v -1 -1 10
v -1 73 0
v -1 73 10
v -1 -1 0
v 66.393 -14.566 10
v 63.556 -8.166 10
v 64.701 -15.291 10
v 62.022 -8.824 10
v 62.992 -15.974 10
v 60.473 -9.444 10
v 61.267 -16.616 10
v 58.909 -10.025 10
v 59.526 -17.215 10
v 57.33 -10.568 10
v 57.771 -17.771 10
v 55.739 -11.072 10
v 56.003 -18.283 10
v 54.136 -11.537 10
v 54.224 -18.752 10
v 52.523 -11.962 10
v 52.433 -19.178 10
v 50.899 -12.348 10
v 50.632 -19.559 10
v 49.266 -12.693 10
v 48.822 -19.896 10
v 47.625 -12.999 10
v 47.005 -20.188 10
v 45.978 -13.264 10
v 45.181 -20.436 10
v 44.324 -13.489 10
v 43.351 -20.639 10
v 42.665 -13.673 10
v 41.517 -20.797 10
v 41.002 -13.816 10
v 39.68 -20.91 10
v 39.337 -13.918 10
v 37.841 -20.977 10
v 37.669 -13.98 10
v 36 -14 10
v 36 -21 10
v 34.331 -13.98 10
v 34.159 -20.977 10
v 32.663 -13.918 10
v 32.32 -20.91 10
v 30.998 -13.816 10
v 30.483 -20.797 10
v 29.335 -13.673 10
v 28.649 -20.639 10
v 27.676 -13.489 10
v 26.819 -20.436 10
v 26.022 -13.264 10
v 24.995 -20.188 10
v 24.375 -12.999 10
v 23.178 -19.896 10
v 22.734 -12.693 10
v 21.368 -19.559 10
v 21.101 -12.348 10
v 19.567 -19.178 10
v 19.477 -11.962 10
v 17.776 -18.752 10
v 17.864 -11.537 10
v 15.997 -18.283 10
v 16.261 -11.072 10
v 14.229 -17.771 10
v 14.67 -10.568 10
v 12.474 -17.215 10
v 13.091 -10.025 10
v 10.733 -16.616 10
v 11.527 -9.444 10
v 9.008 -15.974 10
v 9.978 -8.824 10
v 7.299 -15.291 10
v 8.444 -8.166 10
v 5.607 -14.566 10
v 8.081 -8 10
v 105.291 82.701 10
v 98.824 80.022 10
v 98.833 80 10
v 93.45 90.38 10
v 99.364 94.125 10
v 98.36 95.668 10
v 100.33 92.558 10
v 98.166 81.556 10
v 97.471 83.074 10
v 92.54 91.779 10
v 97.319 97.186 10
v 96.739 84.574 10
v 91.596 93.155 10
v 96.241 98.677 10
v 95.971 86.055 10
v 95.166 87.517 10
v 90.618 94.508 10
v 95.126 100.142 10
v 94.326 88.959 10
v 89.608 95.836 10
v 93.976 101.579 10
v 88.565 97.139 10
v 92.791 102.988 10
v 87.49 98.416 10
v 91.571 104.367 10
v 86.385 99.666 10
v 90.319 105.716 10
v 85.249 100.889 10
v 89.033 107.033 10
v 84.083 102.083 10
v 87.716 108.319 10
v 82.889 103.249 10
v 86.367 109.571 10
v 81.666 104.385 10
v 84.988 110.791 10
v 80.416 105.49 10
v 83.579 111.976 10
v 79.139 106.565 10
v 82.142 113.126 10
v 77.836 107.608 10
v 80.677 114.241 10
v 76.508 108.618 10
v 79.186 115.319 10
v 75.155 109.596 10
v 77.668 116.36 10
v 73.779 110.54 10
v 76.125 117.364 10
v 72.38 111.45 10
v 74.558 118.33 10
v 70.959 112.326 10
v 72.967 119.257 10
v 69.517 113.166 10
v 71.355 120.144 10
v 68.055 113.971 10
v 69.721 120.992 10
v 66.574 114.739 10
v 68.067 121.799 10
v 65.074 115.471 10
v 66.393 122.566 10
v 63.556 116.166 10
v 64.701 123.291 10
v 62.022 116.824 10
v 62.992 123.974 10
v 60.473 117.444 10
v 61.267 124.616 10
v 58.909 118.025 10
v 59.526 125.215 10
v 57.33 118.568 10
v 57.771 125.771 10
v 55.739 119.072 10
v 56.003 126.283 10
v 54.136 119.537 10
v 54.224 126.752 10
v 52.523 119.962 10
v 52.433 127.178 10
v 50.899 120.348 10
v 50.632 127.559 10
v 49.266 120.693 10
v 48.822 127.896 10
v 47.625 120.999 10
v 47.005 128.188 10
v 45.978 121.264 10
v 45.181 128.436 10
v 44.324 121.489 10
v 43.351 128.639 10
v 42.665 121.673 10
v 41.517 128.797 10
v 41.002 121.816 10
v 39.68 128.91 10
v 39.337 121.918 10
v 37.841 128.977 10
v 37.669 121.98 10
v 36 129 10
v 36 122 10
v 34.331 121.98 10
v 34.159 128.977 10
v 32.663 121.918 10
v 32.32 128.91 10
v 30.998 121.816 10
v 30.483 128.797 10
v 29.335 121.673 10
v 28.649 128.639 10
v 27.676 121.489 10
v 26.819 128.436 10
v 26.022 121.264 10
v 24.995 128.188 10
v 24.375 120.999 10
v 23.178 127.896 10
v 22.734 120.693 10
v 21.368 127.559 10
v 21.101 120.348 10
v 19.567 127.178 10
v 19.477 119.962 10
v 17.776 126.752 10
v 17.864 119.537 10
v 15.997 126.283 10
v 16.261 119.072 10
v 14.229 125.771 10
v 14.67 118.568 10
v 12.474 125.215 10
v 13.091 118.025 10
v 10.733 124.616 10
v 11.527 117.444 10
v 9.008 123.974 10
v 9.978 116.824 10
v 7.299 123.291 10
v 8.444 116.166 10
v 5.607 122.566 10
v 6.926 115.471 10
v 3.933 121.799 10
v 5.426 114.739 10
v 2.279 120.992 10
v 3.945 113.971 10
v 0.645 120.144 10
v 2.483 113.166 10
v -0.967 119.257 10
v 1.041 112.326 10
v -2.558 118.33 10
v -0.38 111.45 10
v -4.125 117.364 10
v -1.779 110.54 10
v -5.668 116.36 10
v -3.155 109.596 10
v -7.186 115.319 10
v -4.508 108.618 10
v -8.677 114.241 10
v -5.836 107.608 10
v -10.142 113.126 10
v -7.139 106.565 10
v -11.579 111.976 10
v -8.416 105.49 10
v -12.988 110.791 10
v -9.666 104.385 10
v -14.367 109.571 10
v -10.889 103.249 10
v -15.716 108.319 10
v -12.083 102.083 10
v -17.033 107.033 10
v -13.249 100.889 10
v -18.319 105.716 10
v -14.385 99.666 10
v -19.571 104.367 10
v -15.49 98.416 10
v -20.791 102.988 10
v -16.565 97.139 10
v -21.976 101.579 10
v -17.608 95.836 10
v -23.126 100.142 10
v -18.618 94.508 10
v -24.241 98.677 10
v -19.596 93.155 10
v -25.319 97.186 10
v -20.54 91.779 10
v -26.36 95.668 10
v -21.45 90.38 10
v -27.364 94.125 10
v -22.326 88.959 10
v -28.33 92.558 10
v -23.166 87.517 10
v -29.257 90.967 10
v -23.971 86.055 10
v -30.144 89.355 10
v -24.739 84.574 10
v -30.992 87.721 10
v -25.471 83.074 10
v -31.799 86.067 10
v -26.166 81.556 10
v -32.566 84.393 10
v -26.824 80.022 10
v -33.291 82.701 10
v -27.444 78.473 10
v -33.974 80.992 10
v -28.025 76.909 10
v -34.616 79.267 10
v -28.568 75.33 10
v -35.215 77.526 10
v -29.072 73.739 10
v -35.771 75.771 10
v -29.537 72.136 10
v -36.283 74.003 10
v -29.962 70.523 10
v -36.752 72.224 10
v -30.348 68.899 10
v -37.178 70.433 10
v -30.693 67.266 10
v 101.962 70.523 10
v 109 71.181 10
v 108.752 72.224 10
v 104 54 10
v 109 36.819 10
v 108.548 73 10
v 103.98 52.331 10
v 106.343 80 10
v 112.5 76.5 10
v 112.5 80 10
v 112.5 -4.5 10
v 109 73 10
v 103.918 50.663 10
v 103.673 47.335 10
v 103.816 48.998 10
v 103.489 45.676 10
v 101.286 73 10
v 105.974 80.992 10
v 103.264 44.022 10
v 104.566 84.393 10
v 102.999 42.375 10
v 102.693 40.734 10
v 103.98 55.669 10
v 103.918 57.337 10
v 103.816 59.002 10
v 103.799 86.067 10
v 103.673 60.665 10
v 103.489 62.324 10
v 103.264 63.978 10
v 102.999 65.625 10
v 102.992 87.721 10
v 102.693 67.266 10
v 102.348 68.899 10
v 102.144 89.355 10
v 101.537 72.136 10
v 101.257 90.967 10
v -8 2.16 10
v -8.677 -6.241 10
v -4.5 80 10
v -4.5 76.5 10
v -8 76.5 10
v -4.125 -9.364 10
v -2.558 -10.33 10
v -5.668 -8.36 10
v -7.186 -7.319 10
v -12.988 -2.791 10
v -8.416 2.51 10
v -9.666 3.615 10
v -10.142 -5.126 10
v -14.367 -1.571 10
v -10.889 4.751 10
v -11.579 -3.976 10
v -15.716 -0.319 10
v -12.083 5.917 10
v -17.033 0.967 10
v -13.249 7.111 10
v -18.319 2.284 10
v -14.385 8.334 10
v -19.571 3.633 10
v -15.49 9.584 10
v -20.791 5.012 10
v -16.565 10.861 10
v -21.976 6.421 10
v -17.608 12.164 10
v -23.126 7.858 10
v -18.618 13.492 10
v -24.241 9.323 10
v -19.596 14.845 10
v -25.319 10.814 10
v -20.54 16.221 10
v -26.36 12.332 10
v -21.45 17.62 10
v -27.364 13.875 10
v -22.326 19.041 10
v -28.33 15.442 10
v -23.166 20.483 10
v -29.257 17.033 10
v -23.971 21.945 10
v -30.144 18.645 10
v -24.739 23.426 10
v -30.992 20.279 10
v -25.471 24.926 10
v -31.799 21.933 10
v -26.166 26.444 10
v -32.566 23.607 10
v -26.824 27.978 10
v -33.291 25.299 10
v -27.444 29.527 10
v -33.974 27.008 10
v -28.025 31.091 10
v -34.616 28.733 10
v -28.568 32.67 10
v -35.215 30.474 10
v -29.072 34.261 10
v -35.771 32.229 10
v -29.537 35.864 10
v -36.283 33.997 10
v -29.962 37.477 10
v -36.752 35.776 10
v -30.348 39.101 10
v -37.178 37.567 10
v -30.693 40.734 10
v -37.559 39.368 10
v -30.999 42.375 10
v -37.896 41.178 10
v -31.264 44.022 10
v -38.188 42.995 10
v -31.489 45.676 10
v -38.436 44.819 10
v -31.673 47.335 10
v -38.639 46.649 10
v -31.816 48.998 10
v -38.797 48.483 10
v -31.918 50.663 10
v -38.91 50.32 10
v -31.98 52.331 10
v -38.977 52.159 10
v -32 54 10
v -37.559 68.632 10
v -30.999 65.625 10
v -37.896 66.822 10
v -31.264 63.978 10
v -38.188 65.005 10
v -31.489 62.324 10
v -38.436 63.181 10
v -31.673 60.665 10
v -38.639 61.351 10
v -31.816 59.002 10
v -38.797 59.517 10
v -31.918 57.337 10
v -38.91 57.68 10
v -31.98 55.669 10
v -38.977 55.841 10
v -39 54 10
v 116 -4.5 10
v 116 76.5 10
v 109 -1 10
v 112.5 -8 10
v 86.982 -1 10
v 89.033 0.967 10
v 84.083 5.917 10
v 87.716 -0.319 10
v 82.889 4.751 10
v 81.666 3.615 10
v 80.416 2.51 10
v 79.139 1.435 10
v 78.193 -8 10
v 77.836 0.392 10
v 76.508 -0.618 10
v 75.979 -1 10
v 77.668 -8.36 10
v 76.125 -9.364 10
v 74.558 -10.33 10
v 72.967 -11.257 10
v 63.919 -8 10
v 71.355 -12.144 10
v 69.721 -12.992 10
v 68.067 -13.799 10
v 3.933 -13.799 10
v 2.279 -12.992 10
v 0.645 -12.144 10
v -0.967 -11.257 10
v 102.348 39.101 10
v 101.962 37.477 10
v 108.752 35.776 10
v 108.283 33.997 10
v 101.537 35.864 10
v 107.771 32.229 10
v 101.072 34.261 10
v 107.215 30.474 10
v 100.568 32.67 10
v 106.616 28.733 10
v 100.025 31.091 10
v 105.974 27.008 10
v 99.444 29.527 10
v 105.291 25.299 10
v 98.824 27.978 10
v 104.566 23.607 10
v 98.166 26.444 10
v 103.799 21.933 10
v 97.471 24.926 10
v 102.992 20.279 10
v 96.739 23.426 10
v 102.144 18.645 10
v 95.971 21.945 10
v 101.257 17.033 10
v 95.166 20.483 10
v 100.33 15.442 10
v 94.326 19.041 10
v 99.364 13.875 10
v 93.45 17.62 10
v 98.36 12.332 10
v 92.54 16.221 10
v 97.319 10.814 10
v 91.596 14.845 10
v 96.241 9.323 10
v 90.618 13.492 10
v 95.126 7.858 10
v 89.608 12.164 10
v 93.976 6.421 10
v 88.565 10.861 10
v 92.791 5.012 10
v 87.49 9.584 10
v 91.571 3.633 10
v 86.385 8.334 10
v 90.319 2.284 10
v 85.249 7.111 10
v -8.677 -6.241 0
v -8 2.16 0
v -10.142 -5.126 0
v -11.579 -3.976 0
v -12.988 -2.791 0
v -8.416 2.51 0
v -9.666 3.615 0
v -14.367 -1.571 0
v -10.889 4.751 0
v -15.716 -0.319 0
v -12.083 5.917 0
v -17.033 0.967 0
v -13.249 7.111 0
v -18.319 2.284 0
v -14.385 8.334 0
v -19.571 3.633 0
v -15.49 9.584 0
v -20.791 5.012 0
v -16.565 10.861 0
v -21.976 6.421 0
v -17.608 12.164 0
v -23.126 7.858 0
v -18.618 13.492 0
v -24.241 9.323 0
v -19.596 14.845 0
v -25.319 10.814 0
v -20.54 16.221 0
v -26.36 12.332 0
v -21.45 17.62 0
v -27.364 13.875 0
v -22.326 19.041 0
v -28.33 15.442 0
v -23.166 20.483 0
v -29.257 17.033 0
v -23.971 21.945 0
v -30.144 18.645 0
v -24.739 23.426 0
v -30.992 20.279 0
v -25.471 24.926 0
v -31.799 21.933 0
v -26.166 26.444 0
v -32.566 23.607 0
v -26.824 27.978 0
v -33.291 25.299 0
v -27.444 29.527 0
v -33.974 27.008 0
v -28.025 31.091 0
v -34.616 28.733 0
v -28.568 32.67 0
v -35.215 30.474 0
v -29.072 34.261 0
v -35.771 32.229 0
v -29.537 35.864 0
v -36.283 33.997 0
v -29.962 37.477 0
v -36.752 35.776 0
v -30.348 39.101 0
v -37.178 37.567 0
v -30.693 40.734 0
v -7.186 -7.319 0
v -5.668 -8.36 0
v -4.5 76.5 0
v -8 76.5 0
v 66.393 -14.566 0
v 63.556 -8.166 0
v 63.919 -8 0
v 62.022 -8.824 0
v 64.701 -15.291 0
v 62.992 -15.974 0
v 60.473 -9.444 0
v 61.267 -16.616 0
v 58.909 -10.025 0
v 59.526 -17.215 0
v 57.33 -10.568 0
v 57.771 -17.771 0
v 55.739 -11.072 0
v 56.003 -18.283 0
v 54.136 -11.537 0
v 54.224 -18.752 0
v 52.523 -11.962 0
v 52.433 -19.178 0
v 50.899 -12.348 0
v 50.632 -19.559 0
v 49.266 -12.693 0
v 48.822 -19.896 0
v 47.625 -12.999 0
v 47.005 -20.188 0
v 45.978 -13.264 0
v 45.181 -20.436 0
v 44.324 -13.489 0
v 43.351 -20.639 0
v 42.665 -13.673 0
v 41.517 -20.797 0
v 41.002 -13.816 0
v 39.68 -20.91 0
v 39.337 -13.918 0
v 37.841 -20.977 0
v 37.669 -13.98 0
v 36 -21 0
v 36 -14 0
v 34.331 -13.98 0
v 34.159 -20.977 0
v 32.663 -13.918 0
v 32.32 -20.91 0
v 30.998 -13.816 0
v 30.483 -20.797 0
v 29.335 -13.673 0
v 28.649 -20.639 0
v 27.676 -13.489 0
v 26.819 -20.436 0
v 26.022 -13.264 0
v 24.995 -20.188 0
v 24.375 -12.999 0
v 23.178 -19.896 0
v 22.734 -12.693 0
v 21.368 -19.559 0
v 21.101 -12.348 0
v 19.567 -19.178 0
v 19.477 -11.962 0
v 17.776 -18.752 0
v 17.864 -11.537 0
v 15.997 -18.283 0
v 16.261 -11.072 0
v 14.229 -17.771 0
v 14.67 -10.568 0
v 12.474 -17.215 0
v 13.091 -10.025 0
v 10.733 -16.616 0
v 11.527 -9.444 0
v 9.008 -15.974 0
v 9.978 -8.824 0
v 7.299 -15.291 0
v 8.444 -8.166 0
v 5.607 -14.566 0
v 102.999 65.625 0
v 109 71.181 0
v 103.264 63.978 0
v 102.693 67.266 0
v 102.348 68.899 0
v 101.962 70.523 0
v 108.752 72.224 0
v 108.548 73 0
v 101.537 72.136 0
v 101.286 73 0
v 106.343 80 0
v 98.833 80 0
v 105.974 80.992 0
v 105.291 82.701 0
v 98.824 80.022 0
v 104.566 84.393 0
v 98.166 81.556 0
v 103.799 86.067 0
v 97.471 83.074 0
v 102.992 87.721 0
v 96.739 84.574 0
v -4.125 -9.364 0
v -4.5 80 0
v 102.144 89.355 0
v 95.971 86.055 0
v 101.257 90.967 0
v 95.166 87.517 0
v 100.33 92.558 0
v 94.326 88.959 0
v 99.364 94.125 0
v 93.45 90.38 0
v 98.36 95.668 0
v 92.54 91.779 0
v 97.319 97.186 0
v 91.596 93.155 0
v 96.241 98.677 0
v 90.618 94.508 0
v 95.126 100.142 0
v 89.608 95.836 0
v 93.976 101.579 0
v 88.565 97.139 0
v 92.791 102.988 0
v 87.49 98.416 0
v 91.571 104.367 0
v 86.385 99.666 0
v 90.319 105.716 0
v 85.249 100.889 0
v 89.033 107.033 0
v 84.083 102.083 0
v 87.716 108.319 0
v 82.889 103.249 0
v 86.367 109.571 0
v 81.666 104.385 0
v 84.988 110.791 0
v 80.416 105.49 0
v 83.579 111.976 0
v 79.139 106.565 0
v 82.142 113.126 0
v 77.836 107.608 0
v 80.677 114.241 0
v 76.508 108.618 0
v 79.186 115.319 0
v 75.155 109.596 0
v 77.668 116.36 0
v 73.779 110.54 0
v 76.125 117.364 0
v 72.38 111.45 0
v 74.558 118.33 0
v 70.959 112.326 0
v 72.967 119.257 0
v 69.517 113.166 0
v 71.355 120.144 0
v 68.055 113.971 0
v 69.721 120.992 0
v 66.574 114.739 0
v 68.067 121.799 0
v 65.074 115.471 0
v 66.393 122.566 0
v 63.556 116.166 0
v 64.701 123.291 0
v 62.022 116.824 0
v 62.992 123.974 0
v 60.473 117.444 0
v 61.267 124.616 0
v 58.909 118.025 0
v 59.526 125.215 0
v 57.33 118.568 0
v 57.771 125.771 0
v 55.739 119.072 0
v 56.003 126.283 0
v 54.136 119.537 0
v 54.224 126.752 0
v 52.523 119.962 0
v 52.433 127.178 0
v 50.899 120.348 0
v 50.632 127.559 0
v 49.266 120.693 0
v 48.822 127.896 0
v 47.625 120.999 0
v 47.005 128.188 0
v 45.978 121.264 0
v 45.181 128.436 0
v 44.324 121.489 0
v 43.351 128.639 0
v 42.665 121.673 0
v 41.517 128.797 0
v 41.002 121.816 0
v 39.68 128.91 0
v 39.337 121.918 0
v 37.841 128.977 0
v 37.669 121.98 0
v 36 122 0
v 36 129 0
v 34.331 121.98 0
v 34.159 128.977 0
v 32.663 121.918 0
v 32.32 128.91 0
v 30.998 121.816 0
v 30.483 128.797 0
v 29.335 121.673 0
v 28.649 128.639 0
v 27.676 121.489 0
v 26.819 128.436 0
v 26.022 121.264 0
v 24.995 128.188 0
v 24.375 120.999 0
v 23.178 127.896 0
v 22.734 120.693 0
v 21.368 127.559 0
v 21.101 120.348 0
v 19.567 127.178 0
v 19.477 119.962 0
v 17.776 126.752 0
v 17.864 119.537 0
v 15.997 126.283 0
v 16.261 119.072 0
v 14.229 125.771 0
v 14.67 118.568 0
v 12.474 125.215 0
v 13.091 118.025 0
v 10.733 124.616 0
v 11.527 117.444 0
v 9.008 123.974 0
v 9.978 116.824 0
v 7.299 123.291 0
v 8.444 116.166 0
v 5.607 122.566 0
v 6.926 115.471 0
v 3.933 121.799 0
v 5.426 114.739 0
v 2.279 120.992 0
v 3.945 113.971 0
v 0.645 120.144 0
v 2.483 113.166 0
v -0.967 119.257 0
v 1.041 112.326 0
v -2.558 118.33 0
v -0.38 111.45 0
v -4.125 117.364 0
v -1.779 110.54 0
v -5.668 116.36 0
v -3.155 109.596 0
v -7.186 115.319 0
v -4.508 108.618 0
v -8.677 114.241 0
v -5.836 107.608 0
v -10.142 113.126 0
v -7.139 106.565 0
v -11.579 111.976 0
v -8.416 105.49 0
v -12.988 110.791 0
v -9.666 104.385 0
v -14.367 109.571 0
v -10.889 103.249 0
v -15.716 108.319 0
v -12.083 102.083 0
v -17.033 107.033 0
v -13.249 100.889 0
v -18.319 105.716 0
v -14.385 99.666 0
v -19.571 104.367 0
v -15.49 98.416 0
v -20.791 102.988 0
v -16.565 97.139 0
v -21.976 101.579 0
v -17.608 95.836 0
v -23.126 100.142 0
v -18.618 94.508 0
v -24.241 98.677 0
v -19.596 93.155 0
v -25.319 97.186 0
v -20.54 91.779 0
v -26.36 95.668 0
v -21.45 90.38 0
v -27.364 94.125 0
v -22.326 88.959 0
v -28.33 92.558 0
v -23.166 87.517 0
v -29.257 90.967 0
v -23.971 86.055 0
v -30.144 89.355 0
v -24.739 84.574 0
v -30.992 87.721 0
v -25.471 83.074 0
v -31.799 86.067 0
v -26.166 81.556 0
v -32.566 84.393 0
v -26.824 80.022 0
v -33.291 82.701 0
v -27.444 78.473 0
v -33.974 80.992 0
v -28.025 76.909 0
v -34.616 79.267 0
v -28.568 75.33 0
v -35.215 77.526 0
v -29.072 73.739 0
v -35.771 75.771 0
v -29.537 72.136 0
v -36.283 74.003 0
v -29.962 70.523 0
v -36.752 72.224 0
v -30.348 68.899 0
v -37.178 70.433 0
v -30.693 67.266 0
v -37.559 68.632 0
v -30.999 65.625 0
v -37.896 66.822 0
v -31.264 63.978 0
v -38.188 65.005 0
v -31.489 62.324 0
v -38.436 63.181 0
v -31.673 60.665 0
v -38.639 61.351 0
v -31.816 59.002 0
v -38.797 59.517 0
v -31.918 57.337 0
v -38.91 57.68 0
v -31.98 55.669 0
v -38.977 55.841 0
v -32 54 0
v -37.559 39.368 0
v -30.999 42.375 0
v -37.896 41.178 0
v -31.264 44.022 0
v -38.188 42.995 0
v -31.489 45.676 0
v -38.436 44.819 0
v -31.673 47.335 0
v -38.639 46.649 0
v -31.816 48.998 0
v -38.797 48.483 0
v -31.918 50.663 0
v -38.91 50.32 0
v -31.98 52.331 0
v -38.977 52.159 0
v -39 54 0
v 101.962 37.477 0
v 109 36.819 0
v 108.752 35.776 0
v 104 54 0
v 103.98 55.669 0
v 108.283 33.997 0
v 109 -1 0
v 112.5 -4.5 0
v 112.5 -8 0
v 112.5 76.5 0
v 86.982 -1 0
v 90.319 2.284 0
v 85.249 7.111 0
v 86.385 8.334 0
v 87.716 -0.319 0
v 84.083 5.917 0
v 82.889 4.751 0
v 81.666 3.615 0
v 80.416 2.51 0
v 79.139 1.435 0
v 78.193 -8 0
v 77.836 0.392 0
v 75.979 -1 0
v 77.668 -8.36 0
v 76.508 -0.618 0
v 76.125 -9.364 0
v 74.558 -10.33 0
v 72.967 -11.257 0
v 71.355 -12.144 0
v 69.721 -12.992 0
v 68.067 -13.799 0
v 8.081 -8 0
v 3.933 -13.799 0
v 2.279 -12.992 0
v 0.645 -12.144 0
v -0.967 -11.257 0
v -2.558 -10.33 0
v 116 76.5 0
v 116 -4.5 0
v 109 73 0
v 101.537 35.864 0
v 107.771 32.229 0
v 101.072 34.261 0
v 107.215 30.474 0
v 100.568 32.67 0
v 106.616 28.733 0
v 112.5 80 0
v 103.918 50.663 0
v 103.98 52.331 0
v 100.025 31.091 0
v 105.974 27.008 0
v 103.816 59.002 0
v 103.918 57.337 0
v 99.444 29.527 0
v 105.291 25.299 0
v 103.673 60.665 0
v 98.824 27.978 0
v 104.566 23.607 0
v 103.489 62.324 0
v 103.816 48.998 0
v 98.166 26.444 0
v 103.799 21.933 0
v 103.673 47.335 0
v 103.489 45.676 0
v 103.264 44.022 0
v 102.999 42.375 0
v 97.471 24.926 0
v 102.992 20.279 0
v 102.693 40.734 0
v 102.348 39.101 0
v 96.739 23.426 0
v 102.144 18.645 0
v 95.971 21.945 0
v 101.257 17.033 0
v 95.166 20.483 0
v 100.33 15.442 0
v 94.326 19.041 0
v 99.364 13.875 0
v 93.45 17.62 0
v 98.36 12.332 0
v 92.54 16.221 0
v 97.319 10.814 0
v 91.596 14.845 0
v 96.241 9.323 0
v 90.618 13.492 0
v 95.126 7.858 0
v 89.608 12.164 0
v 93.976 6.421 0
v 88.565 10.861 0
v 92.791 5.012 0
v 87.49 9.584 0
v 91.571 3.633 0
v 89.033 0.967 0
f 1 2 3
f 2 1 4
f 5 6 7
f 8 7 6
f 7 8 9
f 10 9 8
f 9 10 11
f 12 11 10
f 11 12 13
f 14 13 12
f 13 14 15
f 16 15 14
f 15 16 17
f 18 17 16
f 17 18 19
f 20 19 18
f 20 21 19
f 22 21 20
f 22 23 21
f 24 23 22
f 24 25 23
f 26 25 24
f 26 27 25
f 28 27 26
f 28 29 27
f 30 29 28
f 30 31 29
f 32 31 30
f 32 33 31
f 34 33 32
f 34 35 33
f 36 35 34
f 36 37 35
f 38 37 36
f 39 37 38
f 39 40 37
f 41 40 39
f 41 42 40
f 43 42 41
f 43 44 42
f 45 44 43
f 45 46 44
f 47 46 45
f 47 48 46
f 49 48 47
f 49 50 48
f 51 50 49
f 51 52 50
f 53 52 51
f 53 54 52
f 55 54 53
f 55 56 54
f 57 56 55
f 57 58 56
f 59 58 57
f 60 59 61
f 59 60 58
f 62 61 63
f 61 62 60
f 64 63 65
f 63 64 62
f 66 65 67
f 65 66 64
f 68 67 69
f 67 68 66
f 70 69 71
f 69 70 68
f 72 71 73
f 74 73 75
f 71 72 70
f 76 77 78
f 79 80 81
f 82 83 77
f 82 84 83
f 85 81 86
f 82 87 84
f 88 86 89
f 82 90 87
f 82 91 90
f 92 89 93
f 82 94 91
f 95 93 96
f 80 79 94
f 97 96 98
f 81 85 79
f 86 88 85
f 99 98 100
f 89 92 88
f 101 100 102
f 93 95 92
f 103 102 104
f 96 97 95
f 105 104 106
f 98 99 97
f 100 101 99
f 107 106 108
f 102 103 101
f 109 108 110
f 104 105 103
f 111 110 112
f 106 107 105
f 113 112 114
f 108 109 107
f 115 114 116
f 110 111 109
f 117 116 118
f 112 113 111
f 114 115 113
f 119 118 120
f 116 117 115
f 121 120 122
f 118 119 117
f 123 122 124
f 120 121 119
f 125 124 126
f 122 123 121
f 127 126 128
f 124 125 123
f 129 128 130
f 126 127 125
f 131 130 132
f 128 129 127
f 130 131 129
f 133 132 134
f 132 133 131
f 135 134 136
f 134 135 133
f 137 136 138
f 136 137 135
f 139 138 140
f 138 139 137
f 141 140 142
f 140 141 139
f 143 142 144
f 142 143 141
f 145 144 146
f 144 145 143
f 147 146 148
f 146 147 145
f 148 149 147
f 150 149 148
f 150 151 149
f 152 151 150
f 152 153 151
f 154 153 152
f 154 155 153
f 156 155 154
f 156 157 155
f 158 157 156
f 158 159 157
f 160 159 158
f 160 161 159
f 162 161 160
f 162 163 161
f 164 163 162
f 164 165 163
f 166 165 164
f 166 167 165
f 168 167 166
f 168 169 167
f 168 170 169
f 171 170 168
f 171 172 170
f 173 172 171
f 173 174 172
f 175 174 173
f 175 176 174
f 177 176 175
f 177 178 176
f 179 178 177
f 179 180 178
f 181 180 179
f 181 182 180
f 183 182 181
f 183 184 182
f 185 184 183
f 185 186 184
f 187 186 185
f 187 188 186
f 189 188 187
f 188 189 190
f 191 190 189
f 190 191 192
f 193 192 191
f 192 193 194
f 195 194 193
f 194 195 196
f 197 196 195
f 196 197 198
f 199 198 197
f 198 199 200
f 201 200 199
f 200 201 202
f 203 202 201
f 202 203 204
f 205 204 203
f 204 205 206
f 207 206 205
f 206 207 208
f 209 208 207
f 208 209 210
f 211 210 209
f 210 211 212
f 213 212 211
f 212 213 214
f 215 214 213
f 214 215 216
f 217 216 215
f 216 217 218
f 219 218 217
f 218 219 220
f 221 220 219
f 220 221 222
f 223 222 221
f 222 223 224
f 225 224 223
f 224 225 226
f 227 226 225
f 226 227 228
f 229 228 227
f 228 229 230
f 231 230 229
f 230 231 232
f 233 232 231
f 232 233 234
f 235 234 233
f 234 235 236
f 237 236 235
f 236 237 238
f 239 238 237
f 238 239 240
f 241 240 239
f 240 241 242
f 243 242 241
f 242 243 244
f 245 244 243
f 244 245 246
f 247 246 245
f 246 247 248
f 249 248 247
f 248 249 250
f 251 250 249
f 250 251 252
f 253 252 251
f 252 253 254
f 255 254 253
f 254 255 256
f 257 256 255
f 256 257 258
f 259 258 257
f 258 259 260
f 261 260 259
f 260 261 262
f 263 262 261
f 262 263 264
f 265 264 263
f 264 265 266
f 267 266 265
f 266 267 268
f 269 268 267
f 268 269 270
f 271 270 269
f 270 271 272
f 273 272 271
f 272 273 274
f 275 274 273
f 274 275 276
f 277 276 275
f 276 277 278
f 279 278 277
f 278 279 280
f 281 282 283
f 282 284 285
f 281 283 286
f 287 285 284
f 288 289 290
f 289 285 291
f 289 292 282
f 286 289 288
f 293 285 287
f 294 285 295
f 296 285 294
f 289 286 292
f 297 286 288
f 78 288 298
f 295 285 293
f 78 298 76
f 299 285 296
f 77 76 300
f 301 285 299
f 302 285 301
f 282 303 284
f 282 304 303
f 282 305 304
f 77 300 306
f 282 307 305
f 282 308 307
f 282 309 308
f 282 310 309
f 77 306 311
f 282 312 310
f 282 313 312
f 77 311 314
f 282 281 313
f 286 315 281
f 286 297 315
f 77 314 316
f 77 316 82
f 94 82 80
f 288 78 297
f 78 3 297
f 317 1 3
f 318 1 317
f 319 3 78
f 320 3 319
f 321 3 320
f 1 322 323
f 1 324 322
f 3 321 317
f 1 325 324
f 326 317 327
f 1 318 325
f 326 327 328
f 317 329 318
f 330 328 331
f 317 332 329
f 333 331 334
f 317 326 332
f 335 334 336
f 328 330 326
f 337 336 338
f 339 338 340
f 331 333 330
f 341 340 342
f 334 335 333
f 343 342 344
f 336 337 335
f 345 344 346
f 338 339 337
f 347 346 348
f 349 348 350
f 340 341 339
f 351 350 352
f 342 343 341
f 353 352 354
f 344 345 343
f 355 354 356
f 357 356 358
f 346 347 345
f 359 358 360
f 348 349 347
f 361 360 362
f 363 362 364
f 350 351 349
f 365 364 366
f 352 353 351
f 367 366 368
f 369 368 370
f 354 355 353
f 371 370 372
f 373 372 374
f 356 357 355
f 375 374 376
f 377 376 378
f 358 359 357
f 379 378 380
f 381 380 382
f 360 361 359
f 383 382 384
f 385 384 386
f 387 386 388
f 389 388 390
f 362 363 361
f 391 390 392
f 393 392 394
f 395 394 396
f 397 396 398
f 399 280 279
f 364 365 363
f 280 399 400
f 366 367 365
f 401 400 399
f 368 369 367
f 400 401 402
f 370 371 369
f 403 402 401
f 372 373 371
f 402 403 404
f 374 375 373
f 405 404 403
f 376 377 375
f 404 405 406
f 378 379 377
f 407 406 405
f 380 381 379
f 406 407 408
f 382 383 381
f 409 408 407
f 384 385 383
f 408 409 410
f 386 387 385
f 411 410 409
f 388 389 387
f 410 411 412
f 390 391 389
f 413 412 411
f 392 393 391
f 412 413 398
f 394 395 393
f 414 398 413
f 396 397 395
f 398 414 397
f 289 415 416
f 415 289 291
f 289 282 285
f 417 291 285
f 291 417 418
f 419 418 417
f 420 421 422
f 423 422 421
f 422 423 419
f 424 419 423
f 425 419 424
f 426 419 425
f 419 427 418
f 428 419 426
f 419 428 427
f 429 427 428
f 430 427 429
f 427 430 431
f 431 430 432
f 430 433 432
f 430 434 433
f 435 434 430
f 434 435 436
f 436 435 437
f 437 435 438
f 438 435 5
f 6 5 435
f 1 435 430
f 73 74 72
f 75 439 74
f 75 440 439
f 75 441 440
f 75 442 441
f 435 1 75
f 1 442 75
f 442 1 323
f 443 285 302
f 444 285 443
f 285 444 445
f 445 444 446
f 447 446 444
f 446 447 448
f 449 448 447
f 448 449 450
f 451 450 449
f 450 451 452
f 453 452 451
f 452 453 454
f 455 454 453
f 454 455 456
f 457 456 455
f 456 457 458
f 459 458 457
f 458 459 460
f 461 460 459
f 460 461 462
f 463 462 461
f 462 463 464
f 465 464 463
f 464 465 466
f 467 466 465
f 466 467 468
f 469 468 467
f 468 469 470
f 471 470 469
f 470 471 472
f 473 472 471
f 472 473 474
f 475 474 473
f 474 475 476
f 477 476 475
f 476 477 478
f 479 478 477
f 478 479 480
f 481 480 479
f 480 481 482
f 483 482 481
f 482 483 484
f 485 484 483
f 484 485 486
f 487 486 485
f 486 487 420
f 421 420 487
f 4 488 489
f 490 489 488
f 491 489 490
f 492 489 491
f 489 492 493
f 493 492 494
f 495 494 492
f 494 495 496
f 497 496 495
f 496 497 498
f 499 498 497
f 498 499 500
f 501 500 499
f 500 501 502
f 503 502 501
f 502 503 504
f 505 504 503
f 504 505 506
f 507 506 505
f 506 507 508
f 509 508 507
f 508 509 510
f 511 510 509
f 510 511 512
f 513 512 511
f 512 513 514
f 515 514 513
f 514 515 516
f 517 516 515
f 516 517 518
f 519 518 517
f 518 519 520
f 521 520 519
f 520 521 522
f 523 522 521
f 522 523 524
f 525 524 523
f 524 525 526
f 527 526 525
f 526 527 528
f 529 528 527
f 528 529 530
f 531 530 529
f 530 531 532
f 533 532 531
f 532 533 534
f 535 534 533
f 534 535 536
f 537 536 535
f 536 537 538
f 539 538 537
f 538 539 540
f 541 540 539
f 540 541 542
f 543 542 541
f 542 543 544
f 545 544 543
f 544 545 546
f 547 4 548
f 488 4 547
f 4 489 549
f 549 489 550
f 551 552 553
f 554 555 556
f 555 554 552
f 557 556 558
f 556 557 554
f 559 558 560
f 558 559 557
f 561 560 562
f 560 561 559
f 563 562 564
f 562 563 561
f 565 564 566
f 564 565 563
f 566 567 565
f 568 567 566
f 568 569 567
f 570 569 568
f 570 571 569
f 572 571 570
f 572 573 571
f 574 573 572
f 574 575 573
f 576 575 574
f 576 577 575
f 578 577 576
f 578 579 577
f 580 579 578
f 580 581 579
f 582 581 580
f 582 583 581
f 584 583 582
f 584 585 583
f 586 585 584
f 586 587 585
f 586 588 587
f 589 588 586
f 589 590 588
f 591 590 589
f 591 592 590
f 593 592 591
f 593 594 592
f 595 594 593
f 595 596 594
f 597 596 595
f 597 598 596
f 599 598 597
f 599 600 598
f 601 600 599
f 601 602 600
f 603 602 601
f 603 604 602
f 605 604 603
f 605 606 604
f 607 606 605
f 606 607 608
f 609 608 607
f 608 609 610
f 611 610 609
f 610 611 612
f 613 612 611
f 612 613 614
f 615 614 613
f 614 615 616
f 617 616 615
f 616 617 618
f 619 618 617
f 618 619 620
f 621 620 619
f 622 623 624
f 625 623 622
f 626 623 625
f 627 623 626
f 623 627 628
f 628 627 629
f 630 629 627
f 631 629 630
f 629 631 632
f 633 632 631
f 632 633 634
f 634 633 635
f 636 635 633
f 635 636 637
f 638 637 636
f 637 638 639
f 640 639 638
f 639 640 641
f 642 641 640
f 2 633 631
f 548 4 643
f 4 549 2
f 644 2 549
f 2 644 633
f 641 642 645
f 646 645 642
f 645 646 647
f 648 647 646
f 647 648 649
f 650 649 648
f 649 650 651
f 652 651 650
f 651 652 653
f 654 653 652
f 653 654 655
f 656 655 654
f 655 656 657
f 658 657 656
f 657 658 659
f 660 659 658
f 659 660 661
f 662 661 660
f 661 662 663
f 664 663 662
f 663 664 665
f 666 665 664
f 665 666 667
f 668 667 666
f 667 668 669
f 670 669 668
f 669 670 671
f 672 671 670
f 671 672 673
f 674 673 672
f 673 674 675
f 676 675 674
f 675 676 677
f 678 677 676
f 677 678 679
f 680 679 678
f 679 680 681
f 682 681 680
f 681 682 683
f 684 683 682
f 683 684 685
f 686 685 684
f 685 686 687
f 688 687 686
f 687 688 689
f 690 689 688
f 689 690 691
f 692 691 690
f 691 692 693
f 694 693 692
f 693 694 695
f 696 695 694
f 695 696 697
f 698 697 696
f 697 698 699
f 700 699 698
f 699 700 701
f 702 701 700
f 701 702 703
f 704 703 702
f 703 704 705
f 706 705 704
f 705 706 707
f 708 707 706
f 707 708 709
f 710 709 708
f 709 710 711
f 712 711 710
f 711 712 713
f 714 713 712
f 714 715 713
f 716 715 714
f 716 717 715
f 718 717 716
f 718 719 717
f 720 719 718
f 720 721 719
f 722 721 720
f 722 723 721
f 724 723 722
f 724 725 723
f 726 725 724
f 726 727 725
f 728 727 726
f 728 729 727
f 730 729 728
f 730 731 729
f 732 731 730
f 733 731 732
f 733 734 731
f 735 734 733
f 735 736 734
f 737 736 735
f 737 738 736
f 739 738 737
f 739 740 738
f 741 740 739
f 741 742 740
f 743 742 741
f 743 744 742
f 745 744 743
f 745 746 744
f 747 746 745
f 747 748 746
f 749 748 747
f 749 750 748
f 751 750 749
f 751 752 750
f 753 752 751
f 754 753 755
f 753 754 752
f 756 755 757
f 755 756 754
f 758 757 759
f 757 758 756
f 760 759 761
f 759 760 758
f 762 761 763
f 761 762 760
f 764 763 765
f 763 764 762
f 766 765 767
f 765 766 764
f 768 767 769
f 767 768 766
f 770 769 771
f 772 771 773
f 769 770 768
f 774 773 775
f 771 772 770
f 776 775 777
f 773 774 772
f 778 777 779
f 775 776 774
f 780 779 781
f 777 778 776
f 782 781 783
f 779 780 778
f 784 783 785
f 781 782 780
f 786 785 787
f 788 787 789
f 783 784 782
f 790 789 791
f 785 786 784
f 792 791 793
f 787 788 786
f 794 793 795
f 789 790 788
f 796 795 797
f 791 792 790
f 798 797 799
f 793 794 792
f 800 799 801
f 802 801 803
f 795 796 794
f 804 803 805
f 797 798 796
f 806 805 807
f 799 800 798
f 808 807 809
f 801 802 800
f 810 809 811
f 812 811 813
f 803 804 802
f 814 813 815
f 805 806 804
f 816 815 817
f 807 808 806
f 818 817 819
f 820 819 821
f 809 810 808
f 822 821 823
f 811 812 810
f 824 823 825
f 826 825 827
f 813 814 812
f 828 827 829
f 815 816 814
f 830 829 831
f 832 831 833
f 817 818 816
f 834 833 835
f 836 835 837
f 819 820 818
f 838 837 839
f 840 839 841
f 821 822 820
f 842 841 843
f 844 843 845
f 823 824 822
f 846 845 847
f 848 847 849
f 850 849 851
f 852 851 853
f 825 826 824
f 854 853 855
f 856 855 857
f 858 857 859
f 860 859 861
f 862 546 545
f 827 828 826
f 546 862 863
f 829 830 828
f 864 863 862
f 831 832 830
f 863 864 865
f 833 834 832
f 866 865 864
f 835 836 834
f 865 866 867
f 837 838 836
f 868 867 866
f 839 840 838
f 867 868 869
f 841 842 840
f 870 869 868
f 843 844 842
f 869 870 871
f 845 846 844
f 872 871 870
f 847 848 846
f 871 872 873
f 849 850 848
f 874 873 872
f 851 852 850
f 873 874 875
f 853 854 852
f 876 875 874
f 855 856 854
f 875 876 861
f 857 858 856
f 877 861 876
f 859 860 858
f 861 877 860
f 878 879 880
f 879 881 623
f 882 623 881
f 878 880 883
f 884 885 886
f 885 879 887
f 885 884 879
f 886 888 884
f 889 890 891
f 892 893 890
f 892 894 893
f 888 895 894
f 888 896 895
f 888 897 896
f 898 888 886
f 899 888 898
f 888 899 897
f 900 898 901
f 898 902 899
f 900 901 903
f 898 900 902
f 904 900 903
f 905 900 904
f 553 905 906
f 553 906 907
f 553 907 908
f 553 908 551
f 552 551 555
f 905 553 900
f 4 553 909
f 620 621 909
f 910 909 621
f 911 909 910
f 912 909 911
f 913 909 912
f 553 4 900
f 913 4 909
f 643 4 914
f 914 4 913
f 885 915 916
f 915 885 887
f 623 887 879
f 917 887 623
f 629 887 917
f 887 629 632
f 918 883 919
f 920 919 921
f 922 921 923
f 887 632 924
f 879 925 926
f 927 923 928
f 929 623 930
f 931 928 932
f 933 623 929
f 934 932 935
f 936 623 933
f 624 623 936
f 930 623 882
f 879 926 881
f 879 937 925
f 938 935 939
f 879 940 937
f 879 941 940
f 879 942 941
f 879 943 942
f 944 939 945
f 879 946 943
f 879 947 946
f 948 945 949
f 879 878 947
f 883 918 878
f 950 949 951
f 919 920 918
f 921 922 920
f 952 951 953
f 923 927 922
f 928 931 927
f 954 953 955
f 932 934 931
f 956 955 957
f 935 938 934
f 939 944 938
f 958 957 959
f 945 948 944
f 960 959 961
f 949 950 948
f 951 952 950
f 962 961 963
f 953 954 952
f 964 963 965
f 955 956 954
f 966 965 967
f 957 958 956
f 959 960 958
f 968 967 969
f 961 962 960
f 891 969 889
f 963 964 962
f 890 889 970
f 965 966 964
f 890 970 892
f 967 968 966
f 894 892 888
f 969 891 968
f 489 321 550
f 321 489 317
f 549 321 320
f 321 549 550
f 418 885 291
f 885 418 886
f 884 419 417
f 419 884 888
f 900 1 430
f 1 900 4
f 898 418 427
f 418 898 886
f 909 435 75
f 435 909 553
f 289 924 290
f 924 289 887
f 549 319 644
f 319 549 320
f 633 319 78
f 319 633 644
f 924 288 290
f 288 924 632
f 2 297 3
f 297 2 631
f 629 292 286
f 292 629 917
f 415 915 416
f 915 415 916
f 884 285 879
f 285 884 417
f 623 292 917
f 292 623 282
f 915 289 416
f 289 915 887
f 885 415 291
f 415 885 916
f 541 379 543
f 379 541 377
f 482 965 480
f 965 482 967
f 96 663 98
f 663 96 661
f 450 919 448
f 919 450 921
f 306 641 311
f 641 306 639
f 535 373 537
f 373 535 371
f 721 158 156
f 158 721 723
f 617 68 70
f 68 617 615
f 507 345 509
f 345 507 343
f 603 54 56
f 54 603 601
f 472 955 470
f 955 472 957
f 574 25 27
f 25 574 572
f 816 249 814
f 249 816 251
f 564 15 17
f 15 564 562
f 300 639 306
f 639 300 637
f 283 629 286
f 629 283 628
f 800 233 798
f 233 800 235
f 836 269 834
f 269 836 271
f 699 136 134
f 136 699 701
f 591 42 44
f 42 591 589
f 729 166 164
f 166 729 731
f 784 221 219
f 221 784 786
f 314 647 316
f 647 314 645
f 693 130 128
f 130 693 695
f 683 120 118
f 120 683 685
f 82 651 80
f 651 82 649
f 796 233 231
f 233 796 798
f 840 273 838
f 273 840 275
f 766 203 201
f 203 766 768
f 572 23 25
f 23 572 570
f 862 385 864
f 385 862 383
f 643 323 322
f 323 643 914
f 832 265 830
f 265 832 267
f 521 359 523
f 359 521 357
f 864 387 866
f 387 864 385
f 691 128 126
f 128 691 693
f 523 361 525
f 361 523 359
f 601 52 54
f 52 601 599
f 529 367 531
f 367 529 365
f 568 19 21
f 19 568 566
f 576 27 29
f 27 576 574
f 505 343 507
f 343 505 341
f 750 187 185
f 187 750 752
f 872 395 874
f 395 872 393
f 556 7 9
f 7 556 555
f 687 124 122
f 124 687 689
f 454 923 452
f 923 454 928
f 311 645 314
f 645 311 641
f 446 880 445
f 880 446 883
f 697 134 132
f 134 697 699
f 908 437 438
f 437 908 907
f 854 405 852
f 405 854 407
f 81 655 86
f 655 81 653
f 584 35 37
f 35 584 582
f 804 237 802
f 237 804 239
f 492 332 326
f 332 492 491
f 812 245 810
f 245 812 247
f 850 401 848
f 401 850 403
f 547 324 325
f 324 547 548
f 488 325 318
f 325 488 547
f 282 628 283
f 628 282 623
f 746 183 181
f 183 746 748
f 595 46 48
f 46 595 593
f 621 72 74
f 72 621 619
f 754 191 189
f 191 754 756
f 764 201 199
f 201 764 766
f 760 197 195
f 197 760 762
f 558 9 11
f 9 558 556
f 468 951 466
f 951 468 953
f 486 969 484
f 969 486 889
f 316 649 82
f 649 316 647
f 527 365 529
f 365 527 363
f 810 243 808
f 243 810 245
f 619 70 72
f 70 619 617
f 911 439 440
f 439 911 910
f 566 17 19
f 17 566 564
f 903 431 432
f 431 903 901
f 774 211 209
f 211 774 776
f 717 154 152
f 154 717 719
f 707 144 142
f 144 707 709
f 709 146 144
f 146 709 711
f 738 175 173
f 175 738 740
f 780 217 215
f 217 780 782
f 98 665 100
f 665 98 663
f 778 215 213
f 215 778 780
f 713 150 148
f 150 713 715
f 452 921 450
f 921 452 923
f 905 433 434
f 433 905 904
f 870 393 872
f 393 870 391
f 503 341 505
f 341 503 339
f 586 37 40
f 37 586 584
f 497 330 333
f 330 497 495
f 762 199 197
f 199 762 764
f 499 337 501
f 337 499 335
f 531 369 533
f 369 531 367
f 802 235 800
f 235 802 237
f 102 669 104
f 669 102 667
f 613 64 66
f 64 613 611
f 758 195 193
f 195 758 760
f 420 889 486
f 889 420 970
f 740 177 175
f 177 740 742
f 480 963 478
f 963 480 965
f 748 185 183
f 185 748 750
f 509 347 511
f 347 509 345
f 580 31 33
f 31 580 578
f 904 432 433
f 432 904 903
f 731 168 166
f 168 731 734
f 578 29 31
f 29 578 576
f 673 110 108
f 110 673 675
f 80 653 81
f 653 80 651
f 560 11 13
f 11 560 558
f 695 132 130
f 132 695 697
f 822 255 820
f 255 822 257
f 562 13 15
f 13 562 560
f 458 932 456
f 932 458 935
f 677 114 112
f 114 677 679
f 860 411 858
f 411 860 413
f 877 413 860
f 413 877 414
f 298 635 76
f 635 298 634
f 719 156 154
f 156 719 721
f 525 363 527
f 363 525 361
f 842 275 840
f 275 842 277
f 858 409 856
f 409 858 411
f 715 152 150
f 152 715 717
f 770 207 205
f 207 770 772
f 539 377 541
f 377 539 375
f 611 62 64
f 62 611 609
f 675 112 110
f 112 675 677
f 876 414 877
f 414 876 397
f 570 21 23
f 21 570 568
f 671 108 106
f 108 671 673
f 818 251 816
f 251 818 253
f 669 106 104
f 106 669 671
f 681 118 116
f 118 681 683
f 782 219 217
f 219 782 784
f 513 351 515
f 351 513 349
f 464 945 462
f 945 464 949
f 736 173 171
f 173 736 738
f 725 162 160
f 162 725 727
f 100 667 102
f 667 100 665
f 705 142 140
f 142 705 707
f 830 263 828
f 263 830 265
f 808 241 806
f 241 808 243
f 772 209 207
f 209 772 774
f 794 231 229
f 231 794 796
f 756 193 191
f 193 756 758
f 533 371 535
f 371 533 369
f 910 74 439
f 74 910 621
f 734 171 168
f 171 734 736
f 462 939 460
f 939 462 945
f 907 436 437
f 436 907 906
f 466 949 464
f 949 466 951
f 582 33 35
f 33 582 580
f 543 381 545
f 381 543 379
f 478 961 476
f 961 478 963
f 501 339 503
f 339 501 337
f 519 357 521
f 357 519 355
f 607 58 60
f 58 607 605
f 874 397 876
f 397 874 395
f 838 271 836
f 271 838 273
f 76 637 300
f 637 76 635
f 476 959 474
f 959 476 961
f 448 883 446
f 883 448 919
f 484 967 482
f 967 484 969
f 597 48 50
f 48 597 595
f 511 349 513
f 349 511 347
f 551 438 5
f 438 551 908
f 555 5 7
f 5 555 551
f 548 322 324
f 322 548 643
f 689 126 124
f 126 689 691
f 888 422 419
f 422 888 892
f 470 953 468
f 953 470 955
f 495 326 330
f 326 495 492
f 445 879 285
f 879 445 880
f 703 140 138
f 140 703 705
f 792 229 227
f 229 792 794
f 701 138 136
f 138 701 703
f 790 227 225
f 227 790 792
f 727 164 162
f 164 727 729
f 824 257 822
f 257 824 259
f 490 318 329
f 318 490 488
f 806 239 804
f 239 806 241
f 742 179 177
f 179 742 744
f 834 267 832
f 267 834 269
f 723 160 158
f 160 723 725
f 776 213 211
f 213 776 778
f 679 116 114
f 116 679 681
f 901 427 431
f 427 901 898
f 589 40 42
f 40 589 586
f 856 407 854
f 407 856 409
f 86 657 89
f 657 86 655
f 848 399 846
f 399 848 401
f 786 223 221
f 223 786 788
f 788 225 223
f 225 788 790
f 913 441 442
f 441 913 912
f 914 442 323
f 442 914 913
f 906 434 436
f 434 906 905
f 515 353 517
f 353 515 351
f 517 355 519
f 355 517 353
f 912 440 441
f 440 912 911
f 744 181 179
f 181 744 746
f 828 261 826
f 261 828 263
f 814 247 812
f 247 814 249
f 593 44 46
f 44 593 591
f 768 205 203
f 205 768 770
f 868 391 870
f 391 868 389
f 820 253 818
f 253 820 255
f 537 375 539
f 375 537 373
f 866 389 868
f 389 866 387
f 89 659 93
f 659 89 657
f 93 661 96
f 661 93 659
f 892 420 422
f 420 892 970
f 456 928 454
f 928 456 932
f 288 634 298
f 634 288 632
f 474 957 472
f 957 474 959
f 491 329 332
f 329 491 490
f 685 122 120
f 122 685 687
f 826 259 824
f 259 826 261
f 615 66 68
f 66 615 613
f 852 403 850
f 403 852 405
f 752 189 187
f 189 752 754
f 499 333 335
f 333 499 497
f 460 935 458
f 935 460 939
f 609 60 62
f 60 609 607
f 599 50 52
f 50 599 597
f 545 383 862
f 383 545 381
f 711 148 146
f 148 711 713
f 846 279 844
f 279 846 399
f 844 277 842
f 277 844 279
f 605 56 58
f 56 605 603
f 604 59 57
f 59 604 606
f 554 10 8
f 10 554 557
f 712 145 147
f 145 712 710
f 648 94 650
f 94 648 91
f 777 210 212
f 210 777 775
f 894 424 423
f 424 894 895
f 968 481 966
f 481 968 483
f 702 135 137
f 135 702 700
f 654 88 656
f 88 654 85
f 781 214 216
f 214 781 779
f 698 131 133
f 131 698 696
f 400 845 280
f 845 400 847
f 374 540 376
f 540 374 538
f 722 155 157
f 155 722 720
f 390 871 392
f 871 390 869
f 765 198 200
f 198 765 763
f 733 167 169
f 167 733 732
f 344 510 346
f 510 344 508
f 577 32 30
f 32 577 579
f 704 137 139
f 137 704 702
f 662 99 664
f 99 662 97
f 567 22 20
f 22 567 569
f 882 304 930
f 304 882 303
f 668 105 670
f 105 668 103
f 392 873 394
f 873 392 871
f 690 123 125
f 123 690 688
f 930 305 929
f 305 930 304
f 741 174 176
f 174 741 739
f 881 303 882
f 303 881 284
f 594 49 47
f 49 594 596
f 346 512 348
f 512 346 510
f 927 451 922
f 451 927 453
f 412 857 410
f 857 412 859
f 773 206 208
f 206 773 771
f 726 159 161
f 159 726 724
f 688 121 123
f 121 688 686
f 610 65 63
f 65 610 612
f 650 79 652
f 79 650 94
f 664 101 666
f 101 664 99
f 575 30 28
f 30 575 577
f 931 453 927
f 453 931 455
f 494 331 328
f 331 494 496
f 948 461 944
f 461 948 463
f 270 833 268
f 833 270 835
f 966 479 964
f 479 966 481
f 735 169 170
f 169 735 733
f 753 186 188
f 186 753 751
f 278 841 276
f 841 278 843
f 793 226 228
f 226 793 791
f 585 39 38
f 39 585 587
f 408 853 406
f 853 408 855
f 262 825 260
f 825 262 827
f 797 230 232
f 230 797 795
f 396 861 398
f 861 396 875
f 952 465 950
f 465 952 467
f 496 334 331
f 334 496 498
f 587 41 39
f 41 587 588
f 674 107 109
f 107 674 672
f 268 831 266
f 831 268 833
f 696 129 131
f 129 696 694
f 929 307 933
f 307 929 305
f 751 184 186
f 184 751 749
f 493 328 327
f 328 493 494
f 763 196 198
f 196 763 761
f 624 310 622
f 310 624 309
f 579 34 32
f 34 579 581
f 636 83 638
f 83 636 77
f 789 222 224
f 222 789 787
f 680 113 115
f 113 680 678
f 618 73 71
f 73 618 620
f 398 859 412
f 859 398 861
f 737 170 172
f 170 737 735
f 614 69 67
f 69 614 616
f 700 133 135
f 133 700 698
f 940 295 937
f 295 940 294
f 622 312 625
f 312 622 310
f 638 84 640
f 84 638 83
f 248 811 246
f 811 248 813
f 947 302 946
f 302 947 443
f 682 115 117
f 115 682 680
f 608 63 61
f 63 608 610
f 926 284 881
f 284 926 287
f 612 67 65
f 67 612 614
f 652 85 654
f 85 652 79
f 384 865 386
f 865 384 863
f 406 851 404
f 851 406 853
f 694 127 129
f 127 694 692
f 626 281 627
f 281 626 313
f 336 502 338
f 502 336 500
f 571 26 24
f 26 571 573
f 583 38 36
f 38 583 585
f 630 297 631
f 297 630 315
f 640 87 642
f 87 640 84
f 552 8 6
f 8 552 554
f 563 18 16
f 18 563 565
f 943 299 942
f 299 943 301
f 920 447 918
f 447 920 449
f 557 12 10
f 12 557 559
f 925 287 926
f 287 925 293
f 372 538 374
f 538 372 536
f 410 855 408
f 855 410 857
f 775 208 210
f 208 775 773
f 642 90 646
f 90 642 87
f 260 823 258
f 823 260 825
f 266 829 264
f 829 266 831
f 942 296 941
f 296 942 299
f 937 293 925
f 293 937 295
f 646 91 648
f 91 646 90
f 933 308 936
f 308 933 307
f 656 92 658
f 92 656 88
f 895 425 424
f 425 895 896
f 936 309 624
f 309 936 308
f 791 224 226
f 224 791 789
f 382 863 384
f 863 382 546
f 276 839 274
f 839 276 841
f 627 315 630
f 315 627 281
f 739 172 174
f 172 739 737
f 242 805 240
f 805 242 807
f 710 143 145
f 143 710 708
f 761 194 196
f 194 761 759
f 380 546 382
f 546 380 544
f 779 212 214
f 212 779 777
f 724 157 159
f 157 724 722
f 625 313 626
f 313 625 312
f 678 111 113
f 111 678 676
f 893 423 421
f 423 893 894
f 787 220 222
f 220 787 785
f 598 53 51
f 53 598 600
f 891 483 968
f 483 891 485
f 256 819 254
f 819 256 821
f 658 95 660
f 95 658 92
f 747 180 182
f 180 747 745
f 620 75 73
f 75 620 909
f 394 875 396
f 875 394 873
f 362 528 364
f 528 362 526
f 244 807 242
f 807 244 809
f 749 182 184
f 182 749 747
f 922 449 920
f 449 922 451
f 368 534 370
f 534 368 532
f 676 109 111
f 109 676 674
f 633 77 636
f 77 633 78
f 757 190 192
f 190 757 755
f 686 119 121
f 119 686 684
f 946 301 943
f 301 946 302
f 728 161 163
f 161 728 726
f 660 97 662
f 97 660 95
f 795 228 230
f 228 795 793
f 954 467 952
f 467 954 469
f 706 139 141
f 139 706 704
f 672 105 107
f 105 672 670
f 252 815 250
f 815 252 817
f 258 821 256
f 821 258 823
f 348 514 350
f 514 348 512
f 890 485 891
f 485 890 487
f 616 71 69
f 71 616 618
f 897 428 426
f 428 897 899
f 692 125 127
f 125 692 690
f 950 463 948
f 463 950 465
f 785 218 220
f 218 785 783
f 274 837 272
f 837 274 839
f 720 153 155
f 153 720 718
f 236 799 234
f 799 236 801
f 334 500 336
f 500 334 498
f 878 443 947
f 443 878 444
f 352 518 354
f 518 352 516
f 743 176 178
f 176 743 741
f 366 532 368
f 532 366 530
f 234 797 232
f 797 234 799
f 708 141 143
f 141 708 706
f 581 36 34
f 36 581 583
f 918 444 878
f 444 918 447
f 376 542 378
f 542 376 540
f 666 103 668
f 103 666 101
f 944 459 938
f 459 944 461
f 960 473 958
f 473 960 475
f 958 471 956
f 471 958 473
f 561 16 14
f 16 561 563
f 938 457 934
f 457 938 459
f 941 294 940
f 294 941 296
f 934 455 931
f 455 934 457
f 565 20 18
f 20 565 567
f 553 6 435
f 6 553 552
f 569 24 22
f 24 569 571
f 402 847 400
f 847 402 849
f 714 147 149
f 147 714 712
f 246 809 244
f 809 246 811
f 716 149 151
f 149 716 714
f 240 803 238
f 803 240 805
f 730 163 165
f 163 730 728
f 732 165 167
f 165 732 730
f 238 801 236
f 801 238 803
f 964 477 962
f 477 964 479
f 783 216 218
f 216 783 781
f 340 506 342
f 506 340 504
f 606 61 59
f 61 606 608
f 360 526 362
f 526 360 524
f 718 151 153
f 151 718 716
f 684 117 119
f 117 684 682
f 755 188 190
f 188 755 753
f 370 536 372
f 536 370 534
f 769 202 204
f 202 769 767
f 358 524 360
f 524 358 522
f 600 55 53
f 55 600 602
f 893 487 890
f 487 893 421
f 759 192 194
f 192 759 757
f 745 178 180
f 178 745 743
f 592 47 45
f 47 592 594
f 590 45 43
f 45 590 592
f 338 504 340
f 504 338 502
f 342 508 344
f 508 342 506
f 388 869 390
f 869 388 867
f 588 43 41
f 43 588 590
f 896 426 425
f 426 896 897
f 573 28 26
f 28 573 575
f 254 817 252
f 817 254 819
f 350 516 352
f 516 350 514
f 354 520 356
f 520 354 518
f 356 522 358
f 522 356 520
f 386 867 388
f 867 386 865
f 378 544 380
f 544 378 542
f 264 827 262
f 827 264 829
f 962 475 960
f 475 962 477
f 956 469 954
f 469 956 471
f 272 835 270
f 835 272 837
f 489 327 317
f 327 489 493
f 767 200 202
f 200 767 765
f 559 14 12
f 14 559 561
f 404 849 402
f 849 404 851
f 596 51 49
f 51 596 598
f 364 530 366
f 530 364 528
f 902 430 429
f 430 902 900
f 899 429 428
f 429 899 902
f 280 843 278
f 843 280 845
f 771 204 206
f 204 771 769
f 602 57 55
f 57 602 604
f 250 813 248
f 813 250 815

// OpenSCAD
// Generated by SolidPython 1.1.3 on 2026-06-23 12:55:45


union() {
	union() {
		translate(v = [-4.5000000000, 36.0000000000, 5.0000000000]) {
			cube(center = true, size = [7, 81, 10]);
		}
		translate(v = [54.0000000000, -4.5000000000, 5.0000000000]) {
			cube(center = true, size = [117, 7, 10]);
		}
		translate(v = [0, 81]) {
			translate(v = [54.0000000000, -4.5000000000, 5.0000000000]) {
				cube(center = true, size = [117, 7, 10]);
			}
		}
		translate(v = [117, 0]) {
			translate(v = [-4.5000000000, 36.0000000000, 5.0000000000]) {
				cube(center = true, size = [7, 81, 10]);
			}
		}
	}
	translate(v = [36.0000000000, 54.0000000000]) {
		difference() {
			cylinder($fn = 256, h = 10, r = 75.0000000000);
			cylinder($fn = 256, h = 10, r = 68.0000000000);
		}
	}
}
/***********************************************
*********      SolidPython code:      **********
************************************************

"""SCAD file export functions.

This module provides functions for exporting OpenSCAD geometries to .scad files.
"""

from typing import Dict, Optional
from pathlib import Path
import solid

from .config import ExportConfiguration, FileNamingConfig


def export_scad(
    geometry: solid.OpenSCADObject, output_path: Path, header: Optional[str] = None
) -> Path:
    """Export geometry to SCAD file.

    Parameters
    ----------
    geometry : solid.OpenSCADObject
        Geometry to export.
    output_path : Path
        Output file path.
    header : str, optional
        Header comment to add to SCAD file.

    Returns
    -------
    Path
        Path to created SCAD file.

    Raises
    ------
    IOError
        If file cannot be written.

    Examples
    --------
    >>> from pathlib import Path
    >>> import solid
    >>>
    >>> geometry = solid.cube([10, 10, 10])
    >>> output_path = Path('output/device.scad')
    >>> export_scad(geometry, output_path)
    """
    # Ensure parent directory exists
    output_path.parent.mkdir(parents=True, exist_ok=True)

    # Render to file
    try:
        solid.scad_render_to_file(geometry, str(output_path))
    except Exception as e:
        raise IOError(f"Failed to write SCAD file to {output_path}: {e}")

    _normalize_scad_file(output_path)

    # Add header if provided
    if header:
        _add_header_to_scad(output_path, header)
        _normalize_scad_file(output_path)

    return output_path


def _normalize_scad_file(scad_path: Path) -> None:
    """Strip trailing whitespace from generated SCAD text."""
    content = scad_path.read_text()
    normalized = "\n".join(line.rstrip() for line in content.splitlines()) + "\n"
    if normalized != content:
        scad_path.write_text(normalized)


def export_multiple_scad(
    geometries: Dict[str, solid.OpenSCADObject],
    config: ExportConfiguration,
    naming_config: Optional[FileNamingConfig] = None,
) -> Dict[str, Path]:
    """Export multiple geometries to SCAD files.

    Parameters
    ----------
    geometries : dict
        Dictionary mapping prefixes to geometries.
        Keys are used as filename prefixes.
    config : ExportConfiguration
        Export configuration.
    naming_config : FileNamingConfig, optional
        File naming configuration.

    Returns
    -------
    dict
        Dictionary mapping prefixes to output paths.

    Examples
    --------
    >>> geometries = {
    ...     'wells': wells_geometry,
    ...     'channels': channels_geometry,
    ...     'device': device_geometry
    ... }
    >>> config = ExportConfiguration(output_directory=Path('output'))
    >>> paths = export_multiple_scad(geometries, config)
    """
    output_paths = {}

    for prefix, geometry in geometries.items():
        # Create naming config for this geometry
        if naming_config:
            file_config = FileNamingConfig(
                prefix=prefix,
                version=naming_config.version,
                grid_size=naming_config.grid_size,
                suffix=naming_config.suffix,
            )
        else:
            file_config = FileNamingConfig(prefix=prefix)

        # Generate filename
        filename = file_config.generate_filename("scad")
        output_path = config.get_output_path(filename)

        # Export
        export_scad(geometry, output_path)
        output_paths[prefix] = output_path

    return output_paths


def _add_header_to_scad(scad_path: Path, header: str):
    """Add header comment to existing SCAD file.

    Parameters
    ----------
    scad_path : Path
        Path to SCAD file.
    header : str
        Header text to add.
    """
    # Read existing content
    with open(scad_path, "r") as f:
        content = f.read()

    # Prepend header
    header_comment = f"// {header}\n\n"
    with open(scad_path, "w") as f:
        f.write(header_comment + content)


def generate_scad_header(
    device_name: str, version: Optional[str] = None, description: Optional[str] = None
) -> str:
    """Generate SCAD file header comment.

    Parameters
    ----------
    device_name : str
        Device name.
    version : str, optional
        Version string.
    description : str, optional
        Device description.

    Returns
    -------
    str
        Header comment text.

    Examples
    --------
    >>> header = generate_scad_header(
    ...     'Two Compartment Device',
    ...     version='v1',
    ...     description='96-well format with microchannels'
    ... )
    """
    lines = []
    lines.append("=" * 60)
    lines.append(f"Device: {device_name}")

    if version:
        lines.append(f"Version: {version}")

    if description:
        lines.append(f"Description: {description}")

    lines.append("Generated by OpenMFD")
    lines.append("=" * 60)

    return "\n".join(lines)


def validate_scad_file(scad_path: Path) -> bool:
    """Validate that SCAD file exists and is readable.

    Parameters
    ----------
    scad_path : Path
        Path to SCAD file.

    Returns
    -------
    bool
        True if file is valid, False otherwise.
    """
    if not scad_path.exists():
        return False

    if not scad_path.is_file():
        return False

    # Try to read file
    try:
        with open(scad_path, "r") as f:
            content = f.read()
        return len(content) > 0
    except Exception:
        return False


************************************************/
